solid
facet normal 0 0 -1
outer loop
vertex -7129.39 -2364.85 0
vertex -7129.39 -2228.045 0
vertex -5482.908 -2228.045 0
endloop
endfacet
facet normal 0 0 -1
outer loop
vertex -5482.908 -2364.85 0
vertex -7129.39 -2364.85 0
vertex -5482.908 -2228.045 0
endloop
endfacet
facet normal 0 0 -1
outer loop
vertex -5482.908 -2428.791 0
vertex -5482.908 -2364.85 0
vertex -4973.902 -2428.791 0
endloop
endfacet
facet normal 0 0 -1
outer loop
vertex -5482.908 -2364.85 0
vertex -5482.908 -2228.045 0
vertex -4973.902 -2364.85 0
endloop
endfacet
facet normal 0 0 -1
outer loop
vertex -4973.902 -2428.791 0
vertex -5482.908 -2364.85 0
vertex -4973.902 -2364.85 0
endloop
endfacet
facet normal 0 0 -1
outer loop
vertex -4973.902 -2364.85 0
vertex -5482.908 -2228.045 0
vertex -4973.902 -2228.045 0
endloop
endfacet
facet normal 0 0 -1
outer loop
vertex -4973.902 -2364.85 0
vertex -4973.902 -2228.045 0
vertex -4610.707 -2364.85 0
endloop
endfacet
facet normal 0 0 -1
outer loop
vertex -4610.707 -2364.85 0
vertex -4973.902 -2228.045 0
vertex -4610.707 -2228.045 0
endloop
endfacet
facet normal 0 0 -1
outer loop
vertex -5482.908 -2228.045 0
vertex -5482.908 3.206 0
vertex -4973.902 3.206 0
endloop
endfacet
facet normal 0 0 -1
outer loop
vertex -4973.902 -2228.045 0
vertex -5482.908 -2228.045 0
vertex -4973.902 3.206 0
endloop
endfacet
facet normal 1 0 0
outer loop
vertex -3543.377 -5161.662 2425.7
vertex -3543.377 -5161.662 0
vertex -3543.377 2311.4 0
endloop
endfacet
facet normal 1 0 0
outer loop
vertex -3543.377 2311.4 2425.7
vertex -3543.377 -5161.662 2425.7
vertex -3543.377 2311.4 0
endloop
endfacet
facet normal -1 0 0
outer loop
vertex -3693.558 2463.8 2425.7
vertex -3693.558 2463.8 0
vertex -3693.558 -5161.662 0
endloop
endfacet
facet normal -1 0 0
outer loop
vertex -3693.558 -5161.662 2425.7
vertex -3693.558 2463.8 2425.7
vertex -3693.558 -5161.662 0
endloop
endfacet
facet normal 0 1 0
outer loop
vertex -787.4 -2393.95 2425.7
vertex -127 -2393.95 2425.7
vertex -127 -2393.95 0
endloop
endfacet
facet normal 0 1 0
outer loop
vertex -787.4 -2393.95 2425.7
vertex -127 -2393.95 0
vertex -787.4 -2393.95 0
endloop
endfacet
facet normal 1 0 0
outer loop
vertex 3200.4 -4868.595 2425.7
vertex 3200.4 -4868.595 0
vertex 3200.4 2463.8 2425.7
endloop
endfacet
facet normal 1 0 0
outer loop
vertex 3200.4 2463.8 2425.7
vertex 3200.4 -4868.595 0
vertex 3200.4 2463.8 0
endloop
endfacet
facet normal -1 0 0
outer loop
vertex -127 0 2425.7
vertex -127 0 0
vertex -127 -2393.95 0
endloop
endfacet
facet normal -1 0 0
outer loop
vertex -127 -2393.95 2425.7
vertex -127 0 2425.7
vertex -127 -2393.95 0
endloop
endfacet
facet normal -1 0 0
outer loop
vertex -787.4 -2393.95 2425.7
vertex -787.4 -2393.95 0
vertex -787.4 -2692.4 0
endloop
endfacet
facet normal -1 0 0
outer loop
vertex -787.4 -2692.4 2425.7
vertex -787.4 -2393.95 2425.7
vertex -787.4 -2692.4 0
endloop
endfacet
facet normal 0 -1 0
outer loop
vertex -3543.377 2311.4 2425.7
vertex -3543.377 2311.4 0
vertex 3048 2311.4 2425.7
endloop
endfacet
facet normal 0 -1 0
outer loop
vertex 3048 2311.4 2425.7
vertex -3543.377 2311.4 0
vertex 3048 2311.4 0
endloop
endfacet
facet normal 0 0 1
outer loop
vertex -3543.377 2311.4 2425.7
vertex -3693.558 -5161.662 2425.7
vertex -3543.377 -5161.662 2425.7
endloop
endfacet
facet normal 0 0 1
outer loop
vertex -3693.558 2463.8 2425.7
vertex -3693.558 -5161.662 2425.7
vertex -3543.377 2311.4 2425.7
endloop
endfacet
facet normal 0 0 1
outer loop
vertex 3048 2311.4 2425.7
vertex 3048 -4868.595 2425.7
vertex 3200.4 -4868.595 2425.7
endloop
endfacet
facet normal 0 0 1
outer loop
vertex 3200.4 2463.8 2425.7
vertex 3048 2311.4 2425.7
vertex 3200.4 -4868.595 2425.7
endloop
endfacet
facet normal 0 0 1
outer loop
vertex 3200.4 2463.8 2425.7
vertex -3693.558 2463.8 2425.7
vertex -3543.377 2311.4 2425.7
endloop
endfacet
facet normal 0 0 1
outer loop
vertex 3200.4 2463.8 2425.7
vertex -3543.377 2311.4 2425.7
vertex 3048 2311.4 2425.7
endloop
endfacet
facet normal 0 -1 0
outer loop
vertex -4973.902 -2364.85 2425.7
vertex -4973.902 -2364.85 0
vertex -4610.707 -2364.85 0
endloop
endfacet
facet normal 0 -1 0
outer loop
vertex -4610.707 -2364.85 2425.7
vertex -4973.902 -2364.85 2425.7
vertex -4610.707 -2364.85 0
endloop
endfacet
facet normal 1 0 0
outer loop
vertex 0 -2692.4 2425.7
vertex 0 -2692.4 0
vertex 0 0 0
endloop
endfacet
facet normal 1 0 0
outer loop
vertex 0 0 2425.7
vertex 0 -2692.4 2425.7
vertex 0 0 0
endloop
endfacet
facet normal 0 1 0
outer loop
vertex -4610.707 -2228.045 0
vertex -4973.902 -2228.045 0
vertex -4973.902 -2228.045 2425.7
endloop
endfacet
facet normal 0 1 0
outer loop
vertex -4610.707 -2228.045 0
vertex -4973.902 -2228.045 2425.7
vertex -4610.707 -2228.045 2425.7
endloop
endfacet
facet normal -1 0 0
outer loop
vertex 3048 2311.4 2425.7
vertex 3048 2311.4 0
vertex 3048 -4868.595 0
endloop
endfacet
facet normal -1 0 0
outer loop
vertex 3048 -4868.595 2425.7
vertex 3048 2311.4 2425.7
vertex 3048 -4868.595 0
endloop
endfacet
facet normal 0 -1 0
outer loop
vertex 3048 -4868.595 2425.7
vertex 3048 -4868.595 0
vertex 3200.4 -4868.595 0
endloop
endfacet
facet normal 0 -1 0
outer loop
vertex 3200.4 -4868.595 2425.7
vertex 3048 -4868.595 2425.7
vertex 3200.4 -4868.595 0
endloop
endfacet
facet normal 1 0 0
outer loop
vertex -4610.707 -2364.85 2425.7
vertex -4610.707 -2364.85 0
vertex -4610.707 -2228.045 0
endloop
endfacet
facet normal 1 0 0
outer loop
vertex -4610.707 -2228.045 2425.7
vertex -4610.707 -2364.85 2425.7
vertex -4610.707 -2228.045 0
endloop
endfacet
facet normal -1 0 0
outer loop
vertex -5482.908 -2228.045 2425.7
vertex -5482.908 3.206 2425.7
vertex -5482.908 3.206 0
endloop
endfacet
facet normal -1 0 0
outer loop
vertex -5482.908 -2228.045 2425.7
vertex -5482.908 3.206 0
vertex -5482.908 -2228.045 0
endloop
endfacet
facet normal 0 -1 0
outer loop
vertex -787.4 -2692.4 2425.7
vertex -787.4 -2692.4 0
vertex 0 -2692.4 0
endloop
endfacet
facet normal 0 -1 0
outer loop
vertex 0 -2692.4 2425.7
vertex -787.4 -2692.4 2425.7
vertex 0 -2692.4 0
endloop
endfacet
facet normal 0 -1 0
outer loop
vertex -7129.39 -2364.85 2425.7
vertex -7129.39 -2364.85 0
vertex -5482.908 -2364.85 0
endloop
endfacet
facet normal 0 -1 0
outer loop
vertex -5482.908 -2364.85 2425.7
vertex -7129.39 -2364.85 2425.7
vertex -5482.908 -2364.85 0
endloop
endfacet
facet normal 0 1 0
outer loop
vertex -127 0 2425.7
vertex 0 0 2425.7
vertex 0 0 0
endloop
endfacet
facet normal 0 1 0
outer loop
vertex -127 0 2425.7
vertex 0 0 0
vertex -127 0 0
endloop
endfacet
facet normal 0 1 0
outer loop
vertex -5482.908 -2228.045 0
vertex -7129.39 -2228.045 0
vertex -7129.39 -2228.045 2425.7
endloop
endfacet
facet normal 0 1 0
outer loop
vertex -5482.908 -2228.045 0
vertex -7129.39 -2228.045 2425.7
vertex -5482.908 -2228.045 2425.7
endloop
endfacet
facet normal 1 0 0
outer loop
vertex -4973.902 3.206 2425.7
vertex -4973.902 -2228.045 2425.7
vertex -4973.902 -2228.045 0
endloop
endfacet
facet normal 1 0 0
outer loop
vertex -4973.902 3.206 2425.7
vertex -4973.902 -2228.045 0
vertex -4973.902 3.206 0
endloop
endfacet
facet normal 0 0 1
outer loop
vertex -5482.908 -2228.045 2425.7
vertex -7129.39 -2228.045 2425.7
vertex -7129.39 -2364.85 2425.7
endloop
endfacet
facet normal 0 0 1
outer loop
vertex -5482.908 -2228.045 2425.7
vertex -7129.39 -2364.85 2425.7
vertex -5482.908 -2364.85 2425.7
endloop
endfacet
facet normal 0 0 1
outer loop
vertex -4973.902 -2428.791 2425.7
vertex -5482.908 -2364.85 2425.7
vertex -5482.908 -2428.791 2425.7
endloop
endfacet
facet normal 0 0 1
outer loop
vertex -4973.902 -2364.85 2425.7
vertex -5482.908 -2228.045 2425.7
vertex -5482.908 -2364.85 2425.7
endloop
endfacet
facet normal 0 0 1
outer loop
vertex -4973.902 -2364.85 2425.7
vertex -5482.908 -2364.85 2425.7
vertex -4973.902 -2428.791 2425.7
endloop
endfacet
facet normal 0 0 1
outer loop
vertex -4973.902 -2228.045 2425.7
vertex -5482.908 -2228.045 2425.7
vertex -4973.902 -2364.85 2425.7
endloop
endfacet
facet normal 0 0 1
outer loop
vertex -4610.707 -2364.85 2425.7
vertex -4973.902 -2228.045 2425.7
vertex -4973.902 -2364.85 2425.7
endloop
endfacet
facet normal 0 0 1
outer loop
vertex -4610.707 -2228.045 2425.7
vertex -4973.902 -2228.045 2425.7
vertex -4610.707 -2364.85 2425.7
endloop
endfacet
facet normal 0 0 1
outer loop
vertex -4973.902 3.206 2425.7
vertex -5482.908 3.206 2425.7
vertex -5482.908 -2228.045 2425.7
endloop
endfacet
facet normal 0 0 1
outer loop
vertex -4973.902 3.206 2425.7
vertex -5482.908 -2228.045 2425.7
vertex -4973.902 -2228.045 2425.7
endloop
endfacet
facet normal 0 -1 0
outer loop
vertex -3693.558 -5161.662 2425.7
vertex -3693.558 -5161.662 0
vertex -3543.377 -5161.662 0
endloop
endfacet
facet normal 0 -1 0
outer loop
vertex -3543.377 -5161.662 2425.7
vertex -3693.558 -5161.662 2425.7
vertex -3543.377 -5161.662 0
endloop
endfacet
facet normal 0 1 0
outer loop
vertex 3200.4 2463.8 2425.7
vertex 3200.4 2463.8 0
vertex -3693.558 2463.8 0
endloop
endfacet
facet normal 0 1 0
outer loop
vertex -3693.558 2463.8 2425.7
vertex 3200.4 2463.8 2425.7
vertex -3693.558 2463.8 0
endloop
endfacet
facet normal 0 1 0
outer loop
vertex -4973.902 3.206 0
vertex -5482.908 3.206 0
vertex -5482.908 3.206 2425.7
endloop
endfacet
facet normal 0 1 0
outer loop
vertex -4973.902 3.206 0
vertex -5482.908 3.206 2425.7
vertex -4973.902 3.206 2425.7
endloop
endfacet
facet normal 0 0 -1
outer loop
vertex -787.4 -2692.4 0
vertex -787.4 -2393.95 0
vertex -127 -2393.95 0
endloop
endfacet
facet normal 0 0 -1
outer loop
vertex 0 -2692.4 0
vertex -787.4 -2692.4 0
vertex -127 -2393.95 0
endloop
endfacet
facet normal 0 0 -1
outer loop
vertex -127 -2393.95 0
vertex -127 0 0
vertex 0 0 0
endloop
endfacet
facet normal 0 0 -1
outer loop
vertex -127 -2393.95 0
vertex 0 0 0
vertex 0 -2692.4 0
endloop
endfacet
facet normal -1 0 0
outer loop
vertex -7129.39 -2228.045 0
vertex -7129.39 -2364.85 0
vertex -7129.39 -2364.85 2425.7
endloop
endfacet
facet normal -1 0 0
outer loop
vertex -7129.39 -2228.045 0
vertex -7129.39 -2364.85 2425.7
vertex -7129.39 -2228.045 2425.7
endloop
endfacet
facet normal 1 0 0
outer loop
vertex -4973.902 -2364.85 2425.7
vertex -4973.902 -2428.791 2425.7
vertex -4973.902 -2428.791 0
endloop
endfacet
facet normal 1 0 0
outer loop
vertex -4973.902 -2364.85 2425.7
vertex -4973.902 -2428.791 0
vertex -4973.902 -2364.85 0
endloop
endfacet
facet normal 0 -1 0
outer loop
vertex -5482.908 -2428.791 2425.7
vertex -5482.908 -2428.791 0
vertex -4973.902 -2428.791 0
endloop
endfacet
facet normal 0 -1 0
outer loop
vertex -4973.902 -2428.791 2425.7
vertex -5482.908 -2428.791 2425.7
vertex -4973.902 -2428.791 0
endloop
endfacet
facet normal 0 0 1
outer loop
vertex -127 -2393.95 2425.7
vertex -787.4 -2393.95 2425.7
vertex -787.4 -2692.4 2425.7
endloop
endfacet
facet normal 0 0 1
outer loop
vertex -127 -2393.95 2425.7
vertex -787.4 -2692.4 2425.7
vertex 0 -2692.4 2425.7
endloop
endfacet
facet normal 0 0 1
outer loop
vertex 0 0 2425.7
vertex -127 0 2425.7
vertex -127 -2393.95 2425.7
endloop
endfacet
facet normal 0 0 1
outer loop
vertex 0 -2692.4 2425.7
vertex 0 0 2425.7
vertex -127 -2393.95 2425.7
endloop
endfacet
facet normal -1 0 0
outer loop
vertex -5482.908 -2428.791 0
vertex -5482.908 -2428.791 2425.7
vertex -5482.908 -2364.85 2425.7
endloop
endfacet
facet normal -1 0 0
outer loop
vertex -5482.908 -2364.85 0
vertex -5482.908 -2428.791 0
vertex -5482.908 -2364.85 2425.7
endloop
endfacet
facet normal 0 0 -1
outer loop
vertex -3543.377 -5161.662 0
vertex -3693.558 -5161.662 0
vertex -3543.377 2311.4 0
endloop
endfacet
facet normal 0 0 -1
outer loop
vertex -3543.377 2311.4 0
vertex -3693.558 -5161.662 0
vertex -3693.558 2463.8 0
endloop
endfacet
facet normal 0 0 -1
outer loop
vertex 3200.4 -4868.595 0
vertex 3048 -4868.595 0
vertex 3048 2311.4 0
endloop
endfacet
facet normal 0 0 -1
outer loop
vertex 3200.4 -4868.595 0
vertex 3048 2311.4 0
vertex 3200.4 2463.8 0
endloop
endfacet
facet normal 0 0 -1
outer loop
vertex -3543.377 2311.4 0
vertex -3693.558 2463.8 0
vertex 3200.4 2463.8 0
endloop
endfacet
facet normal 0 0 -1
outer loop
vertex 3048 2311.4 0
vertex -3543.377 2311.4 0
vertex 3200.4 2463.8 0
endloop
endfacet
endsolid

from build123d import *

# Parameters (mm, degrees)
F1_DEPTH = 2425.7
F2_W     = 509.006023407
F2_H     = 2231.2512397766
F2_W_2   = 363.1949424744
F2_H_2   = 136.8050575256
F2_W_3   = 1646.4819908142
F2_H_3   = 63.9410018921
F3_DEPTH = 2425.7


with BuildPart() as f1:
    # F0 (on Top) → F1 (new body)
    with BuildSketch(Plane.XY):
        Polygon((0, -2692.4), (0, 0), (-127, 0), (-127, -2393.95), (-787.4, -2393.95), (-787.4, -2692.4), align=None)
    extrude(amount=F1_DEPTH)


with BuildPart() as f3:
    # F2 (on Top) → F3 (new body)
    with BuildSketch(Plane.XY):
        with Locations((-5228.4052371979, -1112.4196052551)):
            Rectangle(F2_W, F2_H)
        with Locations((-4792.3047542572, -2296.4477539062)):
            Rectangle(F2_W_2, F2_H_2)
        with Locations((-5228.4052371979, -2296.4477539062)):
            Rectangle(F2_W, F2_H_2)
        with Locations((-6306.1492443085, -2296.4477539062)):
            Rectangle(F2_W_3, F2_H_2)
        with Locations((-5228.4052371979, -2396.8207836151)):
            Rectangle(F2_W, F2_H_3)
    extrude(amount=F3_DEPTH)


with BuildPart() as f3b:
    # F2 (on Top) → F3, piece 2 (new body)
    with BuildSketch(Plane.XY):
        Polygon((3048, 2311.4), (3048, -4868.5947186378), (3200.4, -4868.5947186378), (3200.4, 2463.8), (-3693.5577988625, 2463.8), (-3693.5577988625, 2311.4), (-3543.3773994446, 2311.4), align=None)
        Polygon((-3543.3773994446, -5161.6616565704), (-3543.3773994446, 2311.4), (-3693.5577988625, 2311.4), (-3693.5577988625, 3.2060146332), (-3693.5577988625, -5161.6616565704), align=None)
    extrude(amount=F3_DEPTH)


solid = Compound([f1.part, f3.part, f3b.part])
